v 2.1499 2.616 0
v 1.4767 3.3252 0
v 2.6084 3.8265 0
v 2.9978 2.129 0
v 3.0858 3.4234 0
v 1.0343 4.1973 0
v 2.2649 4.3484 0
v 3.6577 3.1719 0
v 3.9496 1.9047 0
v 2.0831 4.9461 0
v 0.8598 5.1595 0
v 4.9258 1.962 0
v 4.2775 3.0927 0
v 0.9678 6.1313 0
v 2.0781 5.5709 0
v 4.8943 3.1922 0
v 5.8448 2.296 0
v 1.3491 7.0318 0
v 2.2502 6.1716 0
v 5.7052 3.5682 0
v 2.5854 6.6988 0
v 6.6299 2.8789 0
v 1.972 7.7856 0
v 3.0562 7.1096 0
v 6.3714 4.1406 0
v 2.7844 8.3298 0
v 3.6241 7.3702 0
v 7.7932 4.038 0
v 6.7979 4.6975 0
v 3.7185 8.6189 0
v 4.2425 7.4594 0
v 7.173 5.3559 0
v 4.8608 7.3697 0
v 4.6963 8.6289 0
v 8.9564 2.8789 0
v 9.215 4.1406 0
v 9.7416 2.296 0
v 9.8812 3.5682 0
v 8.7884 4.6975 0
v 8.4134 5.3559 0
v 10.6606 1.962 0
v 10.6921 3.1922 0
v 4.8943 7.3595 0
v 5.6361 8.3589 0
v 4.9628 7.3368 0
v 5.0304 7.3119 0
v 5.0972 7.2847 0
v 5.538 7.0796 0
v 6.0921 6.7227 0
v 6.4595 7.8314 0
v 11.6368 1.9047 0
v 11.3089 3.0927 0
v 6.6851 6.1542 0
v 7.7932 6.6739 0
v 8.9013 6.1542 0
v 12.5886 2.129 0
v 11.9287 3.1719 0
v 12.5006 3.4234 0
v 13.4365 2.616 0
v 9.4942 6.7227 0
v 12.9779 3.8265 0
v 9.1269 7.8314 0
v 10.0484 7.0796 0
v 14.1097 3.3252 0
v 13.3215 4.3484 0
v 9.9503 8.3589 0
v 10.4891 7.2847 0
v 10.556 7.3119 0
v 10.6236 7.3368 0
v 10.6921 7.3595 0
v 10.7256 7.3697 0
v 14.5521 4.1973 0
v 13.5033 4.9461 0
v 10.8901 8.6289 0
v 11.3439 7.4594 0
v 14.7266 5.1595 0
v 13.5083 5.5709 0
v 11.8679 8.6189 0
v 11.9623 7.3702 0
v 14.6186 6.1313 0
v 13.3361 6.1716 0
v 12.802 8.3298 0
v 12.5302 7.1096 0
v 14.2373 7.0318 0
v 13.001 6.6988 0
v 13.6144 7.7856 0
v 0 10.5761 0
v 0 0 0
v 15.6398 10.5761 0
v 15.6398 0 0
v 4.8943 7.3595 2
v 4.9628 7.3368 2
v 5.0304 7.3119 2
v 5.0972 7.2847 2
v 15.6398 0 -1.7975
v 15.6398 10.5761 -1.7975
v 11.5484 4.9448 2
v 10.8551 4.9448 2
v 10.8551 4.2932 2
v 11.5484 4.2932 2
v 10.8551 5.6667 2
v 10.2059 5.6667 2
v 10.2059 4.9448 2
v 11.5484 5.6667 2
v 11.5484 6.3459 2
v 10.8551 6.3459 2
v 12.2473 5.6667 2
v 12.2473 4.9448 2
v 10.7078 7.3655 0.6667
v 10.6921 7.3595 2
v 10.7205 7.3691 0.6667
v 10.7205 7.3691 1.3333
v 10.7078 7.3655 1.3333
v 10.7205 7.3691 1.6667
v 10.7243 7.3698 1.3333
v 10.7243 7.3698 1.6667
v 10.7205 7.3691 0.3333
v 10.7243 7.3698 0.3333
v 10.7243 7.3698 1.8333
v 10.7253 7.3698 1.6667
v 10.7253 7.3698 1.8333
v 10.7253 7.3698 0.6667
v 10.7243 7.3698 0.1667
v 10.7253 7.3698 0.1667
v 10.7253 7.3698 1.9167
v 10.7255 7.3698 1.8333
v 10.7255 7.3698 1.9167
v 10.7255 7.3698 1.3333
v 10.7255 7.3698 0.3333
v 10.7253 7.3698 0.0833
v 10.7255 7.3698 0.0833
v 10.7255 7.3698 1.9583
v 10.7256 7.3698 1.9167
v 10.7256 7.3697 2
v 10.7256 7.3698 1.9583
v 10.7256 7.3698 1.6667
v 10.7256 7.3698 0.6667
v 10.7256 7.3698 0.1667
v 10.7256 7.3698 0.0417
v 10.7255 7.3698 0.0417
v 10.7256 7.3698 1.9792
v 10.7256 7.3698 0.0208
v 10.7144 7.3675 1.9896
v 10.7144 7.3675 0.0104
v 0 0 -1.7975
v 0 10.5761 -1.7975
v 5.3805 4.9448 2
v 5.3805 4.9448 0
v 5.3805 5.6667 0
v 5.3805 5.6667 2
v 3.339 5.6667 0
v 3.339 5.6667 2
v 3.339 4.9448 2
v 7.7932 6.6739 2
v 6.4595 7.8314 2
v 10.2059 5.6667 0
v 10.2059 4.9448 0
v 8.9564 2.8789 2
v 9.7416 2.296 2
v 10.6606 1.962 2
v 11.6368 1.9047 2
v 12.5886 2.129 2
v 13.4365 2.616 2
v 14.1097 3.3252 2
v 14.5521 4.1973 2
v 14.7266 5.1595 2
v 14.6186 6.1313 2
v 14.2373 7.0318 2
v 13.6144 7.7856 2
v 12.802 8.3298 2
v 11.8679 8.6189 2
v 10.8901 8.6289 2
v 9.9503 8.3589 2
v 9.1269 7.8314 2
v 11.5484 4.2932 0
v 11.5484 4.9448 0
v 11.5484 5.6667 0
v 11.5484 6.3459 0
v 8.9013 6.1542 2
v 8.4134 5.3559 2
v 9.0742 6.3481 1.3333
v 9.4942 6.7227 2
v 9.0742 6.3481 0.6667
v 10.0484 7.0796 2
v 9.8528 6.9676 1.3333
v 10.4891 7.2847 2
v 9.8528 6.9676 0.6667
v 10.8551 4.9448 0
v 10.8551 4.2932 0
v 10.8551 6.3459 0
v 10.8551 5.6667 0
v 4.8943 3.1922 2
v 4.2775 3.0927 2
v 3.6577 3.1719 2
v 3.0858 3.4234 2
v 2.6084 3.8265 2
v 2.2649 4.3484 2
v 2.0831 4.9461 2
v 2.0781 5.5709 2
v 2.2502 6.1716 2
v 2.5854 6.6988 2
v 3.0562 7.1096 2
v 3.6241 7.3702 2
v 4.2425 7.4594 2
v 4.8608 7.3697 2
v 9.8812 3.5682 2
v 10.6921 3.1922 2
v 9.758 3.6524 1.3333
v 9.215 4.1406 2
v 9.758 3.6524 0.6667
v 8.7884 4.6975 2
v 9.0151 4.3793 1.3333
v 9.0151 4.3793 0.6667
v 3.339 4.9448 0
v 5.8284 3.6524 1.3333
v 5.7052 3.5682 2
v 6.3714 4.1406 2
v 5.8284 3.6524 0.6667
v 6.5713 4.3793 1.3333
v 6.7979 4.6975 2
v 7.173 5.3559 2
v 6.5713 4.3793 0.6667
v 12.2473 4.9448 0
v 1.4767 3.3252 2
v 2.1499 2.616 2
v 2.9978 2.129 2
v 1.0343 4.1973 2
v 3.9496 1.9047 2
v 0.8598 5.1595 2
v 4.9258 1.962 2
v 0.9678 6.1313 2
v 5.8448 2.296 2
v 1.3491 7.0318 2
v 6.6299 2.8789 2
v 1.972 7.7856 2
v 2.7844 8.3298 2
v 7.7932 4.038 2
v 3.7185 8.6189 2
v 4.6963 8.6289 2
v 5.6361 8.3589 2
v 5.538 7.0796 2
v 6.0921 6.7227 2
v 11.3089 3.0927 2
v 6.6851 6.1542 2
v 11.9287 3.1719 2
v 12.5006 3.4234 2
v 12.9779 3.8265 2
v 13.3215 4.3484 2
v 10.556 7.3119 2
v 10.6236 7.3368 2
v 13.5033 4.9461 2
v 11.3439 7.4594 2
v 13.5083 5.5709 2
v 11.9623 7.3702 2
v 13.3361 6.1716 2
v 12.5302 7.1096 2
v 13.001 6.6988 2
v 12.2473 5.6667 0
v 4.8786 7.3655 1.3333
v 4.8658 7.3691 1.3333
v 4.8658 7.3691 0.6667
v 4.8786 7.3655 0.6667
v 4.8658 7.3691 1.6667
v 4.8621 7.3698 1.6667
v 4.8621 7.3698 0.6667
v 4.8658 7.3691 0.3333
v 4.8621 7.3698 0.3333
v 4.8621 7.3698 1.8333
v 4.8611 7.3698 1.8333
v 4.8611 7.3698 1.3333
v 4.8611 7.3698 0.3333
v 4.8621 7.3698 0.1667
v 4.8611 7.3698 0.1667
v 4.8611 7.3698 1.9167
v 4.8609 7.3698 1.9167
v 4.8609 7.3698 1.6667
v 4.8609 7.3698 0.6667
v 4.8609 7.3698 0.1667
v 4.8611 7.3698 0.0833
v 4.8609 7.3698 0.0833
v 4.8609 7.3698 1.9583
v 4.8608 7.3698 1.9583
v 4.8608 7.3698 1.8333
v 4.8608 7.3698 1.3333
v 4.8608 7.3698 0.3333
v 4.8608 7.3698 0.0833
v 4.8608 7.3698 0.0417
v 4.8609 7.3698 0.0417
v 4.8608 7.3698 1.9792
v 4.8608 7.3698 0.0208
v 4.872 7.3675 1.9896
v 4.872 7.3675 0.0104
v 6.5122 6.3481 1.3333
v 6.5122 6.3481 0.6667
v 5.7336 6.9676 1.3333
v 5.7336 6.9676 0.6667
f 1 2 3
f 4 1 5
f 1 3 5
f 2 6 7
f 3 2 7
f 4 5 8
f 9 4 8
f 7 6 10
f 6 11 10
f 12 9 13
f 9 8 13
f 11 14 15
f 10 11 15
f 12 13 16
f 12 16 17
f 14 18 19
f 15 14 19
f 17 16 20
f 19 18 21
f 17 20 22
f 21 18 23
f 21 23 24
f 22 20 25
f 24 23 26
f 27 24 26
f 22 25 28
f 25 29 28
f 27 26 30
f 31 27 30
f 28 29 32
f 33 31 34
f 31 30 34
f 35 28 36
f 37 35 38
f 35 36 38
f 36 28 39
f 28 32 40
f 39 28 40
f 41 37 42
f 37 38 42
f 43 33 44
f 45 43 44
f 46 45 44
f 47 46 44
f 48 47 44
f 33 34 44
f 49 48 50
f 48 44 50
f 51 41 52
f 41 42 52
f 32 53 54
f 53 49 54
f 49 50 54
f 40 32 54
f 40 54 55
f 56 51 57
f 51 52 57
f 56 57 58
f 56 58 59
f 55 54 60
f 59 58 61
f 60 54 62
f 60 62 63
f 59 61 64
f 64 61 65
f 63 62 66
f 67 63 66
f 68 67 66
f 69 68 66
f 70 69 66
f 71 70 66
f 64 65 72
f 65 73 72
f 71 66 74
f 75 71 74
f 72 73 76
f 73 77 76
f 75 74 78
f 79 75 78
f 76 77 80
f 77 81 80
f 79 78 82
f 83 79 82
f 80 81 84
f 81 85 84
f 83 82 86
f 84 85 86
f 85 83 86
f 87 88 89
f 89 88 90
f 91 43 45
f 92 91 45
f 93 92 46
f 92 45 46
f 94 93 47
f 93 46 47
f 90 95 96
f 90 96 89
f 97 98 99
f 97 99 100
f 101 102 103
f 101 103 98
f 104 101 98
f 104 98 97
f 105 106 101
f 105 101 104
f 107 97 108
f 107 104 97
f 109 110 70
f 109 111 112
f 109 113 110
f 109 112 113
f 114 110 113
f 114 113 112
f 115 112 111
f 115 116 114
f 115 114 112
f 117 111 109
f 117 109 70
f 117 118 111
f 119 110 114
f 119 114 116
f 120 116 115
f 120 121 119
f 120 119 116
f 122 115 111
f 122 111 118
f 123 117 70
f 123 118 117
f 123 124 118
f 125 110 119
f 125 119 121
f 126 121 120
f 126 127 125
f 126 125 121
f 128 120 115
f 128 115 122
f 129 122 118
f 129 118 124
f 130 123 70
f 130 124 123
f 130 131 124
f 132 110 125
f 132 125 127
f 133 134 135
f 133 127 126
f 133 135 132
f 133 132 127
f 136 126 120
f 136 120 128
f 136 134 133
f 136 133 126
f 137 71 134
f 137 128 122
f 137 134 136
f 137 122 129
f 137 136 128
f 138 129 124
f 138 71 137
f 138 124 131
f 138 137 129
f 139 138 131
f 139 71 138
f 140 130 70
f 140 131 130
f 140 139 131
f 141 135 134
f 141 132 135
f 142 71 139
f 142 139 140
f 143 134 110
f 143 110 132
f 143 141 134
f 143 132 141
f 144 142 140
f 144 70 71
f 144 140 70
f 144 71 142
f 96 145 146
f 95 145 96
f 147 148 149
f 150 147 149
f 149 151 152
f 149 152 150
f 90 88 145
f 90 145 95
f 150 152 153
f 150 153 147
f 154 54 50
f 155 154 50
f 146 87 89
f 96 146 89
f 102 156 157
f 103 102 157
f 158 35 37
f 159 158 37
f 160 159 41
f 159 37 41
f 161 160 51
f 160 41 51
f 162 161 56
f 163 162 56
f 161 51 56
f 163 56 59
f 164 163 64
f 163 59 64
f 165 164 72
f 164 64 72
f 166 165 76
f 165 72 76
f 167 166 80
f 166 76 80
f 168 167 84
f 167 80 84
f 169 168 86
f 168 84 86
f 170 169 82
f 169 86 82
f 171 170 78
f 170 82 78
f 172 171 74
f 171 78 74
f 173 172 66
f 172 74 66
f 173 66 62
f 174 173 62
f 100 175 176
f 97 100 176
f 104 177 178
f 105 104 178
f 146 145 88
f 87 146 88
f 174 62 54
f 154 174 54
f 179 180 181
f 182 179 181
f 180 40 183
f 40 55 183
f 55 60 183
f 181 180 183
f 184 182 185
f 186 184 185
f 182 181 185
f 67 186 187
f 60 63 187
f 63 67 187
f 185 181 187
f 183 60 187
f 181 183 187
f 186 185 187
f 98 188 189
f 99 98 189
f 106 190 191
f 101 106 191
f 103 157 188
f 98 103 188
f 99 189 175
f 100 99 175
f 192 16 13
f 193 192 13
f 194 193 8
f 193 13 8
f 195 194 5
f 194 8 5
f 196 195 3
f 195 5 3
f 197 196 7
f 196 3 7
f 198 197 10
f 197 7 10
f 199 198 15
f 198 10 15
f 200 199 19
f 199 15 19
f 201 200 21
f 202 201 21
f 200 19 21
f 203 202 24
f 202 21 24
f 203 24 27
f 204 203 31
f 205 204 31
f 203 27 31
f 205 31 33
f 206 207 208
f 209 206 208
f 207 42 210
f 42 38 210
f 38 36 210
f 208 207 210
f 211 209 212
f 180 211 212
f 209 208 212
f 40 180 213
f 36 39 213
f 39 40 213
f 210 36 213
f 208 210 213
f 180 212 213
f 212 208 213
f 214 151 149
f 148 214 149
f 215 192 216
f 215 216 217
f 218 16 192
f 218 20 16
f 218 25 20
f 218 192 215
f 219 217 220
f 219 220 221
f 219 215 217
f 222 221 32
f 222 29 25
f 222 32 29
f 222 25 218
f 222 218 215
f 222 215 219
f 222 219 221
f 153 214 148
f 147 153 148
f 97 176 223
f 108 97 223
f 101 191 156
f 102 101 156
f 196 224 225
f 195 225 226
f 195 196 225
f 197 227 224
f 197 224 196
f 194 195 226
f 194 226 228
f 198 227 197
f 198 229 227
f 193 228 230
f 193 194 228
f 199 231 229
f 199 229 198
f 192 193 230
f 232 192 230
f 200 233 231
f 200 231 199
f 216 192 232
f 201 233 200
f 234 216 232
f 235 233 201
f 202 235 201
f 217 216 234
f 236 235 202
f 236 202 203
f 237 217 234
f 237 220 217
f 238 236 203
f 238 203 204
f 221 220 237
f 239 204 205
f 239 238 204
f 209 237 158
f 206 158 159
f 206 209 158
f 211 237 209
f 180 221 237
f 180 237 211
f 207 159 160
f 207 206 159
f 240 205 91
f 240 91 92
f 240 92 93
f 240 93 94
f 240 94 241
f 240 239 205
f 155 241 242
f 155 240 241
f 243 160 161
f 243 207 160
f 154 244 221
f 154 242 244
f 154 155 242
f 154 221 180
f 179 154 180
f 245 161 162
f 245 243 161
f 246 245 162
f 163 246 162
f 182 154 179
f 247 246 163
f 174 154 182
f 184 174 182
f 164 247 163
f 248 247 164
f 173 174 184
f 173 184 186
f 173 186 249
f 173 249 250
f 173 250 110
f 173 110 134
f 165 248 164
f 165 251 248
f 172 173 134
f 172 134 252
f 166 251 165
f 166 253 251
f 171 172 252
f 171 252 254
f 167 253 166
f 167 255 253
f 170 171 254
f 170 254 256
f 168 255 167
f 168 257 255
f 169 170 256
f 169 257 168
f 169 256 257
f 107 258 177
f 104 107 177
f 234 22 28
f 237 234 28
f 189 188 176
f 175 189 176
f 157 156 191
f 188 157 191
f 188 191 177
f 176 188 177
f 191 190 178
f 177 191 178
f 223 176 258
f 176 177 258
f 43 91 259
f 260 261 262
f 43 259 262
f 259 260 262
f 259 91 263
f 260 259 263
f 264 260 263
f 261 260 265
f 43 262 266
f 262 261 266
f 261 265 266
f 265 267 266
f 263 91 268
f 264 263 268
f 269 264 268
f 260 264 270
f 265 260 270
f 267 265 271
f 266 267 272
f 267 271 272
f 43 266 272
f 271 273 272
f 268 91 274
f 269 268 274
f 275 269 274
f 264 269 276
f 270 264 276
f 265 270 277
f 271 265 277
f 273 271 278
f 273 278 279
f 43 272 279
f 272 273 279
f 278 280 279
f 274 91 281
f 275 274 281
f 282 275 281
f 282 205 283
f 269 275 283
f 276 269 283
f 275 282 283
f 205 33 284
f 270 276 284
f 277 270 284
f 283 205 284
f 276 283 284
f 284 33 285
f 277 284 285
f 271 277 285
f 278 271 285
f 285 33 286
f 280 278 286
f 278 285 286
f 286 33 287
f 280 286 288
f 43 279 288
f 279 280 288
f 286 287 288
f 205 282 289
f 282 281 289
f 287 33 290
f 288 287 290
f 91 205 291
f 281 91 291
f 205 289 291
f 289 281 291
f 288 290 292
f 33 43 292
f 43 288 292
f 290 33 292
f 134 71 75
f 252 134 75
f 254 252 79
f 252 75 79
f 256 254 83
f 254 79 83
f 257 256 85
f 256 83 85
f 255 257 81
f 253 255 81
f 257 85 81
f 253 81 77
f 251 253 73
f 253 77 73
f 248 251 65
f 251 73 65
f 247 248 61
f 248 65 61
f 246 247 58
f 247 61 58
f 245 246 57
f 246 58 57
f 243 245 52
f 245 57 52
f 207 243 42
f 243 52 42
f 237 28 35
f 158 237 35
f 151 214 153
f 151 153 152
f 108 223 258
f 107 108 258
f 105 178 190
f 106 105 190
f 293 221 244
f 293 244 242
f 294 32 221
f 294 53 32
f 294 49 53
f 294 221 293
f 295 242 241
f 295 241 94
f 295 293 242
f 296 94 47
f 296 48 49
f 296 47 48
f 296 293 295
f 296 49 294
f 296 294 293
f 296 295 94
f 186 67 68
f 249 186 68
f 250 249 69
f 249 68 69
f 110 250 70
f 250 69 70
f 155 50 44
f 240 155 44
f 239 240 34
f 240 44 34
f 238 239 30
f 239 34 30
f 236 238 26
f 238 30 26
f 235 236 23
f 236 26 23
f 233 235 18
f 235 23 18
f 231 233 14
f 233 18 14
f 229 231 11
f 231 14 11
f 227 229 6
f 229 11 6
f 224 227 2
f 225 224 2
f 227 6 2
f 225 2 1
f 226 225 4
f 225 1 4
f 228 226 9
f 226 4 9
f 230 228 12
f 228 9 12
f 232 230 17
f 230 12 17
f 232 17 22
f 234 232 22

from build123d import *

# Parameters (mm, degrees)
F0_W     = 2.0414483733
F0_H     = 0.721976161
F1_DEPTH = 2
F2_W     = 15.6397670507
F2_H     = 1.7975292867
F3_DEPTH = 10.57614


with BuildPart() as f1:
    # F0 (on Top) → F1 (new body)
    with BuildSketch(Plane.XY):
        with Locations((4.3597610202, 5.3057591431)):
            Rectangle(F0_W, F0_H)
    extrude(amount=F1_DEPTH)


with BuildPart() as f1b:
    # F0 (on Top) → F1, piece 2 (new body)
    with BuildSketch(Plane.XY):
        with BuildLine():
            Line((7.7931912586, 6.6738531707), (6.4594786492, 7.8313707121))
            ThreePointArc((6.4594786492, 7.8313707121), (0.8598295398, 5.1594552842), (6.629949957, 2.8789043478))
            Line((6.629949957, 2.8789043478), (7.7931912586, 4.0379823539))
            Line((7.7931912586, 4.0379823539), (8.9564325602, 2.8789043478))
            ThreePointArc((8.9564325602, 2.8789043478), (14.7265529774, 5.1594552842), (9.1269038679, 7.8313707121))
            Line((9.1269038679, 7.8313707121), (7.7931912586, 6.6738531707))
        make_face()
        with BuildLine():
            ThreePointArc((4.894297192, 7.3595173929), (4.9966959497, 7.324631917), (5.0972412206, 7.2847176276))
            add(Edge.make_bspline(
                [(7.1729766205, 5.3559177623), (6.6577003841, 6.5579472848), (5.5758785114, 7.0954281514), (5.0972412206, 7.2847176276)],
                knots=[0, 0, 0, 0, 0.6925736163, 0.6925736163, 0.6925736163, 0.6925736163], degree=3))
            add(Edge.make_bspline(
                [(4.894297192, 3.1922025334), (5.9406389482, 3.5132674966), (6.6252709366, 4.2601390742), (7.1729766205, 5.3559177623)],
                knots=[0, 0, 0, 0, 3.1422990834, 3.1422990834, 3.1422990834, 3.1422990834], degree=3))
            ThreePointArc((4.894297192, 3.1922025334), (2.0581422173, 5.2583593128), (4.8608135864, 7.369712451))
            add(Edge.make_bspline(
                [(4.8608135864, 7.369712451), (4.8604211246, 7.3706277748), (4.8786656068, 7.3666505368), (4.894297192, 7.3595173929)],
                knots=[0.9034710811, 0.9034710811, 0.9034710811, 0.9034710811, 1, 1, 1, 1], degree=3))
        make_face(mode=Mode.SUBTRACT)
        with BuildLine():
            add(Edge.make_bspline(
                [(10.6920853252, 3.1922025334), (9.6457435689, 3.5132674966), (8.9611115805, 4.2601390742), (8.4134058967, 5.3559177623)],
                knots=[0, 0, 0, 0, 3.1422990834, 3.1422990834, 3.1422990834, 3.1422990834], degree=3))
            add(Edge.make_bspline(
                [(8.4134058967, 5.3559177623), (8.9286821331, 6.5579472848), (10.0105040057, 7.0954281514), (10.4891412966, 7.2847176276)],
                knots=[0, 0, 0, 0, 0.6925736163, 0.6925736163, 0.6925736163, 0.6925736163], degree=3))
            ThreePointArc((10.4891412966, 7.2847176276), (10.5896865675, 7.324631917), (10.6920853252, 7.3595173929))
            add(Edge.make_bspline(
                [(10.7255689308, 7.369712451), (10.7259613925, 7.3706277748), (10.7077169104, 7.3666505368), (10.6920853252, 7.3595173929)],
                knots=[0.9034710811, 0.9034710811, 0.9034710811, 0.9034710811, 1, 1, 1, 1], degree=3))
            ThreePointArc((10.7255689308, 7.369712451), (13.5282402999, 5.2583593128), (10.6920853252, 3.1922025334))
        make_face(mode=Mode.SUBTRACT)
    extrude(amount=F1_DEPTH)


with BuildPart() as f1c:
    # F0 (on Top) → F1, piece 3 (new body)
    with BuildSketch(Plane.XY):
        Polygon((11.5484036505, 4.9447710626), (12.2473456837, 4.9447710626), (12.2473456837, 5.6667472236), (11.5484036505, 5.6667472236), (11.5484036505, 6.3459160738), (10.8551047742, 6.3459160738), (10.8551047742, 5.6667472236), (10.2058973103, 5.6667472236), (10.2058973103, 4.9447710626), (10.8551047742, 4.9447710626), (10.8551047742, 4.2932070792), (11.5484036505, 4.2932070792), align=None)
    extrude(amount=F1_DEPTH)


with BuildPart() as f3:
    # F2 (on Front) → F3 (new body)
    with BuildSketch(Plane.XZ):
        with Locations((7.8198835254, -0.8987646434)):
            Rectangle(F2_W, F2_H)
    extrude(amount=-F3_DEPTH)


solid = Compound([f1.part, f1b.part, f1c.part, f3.part])
